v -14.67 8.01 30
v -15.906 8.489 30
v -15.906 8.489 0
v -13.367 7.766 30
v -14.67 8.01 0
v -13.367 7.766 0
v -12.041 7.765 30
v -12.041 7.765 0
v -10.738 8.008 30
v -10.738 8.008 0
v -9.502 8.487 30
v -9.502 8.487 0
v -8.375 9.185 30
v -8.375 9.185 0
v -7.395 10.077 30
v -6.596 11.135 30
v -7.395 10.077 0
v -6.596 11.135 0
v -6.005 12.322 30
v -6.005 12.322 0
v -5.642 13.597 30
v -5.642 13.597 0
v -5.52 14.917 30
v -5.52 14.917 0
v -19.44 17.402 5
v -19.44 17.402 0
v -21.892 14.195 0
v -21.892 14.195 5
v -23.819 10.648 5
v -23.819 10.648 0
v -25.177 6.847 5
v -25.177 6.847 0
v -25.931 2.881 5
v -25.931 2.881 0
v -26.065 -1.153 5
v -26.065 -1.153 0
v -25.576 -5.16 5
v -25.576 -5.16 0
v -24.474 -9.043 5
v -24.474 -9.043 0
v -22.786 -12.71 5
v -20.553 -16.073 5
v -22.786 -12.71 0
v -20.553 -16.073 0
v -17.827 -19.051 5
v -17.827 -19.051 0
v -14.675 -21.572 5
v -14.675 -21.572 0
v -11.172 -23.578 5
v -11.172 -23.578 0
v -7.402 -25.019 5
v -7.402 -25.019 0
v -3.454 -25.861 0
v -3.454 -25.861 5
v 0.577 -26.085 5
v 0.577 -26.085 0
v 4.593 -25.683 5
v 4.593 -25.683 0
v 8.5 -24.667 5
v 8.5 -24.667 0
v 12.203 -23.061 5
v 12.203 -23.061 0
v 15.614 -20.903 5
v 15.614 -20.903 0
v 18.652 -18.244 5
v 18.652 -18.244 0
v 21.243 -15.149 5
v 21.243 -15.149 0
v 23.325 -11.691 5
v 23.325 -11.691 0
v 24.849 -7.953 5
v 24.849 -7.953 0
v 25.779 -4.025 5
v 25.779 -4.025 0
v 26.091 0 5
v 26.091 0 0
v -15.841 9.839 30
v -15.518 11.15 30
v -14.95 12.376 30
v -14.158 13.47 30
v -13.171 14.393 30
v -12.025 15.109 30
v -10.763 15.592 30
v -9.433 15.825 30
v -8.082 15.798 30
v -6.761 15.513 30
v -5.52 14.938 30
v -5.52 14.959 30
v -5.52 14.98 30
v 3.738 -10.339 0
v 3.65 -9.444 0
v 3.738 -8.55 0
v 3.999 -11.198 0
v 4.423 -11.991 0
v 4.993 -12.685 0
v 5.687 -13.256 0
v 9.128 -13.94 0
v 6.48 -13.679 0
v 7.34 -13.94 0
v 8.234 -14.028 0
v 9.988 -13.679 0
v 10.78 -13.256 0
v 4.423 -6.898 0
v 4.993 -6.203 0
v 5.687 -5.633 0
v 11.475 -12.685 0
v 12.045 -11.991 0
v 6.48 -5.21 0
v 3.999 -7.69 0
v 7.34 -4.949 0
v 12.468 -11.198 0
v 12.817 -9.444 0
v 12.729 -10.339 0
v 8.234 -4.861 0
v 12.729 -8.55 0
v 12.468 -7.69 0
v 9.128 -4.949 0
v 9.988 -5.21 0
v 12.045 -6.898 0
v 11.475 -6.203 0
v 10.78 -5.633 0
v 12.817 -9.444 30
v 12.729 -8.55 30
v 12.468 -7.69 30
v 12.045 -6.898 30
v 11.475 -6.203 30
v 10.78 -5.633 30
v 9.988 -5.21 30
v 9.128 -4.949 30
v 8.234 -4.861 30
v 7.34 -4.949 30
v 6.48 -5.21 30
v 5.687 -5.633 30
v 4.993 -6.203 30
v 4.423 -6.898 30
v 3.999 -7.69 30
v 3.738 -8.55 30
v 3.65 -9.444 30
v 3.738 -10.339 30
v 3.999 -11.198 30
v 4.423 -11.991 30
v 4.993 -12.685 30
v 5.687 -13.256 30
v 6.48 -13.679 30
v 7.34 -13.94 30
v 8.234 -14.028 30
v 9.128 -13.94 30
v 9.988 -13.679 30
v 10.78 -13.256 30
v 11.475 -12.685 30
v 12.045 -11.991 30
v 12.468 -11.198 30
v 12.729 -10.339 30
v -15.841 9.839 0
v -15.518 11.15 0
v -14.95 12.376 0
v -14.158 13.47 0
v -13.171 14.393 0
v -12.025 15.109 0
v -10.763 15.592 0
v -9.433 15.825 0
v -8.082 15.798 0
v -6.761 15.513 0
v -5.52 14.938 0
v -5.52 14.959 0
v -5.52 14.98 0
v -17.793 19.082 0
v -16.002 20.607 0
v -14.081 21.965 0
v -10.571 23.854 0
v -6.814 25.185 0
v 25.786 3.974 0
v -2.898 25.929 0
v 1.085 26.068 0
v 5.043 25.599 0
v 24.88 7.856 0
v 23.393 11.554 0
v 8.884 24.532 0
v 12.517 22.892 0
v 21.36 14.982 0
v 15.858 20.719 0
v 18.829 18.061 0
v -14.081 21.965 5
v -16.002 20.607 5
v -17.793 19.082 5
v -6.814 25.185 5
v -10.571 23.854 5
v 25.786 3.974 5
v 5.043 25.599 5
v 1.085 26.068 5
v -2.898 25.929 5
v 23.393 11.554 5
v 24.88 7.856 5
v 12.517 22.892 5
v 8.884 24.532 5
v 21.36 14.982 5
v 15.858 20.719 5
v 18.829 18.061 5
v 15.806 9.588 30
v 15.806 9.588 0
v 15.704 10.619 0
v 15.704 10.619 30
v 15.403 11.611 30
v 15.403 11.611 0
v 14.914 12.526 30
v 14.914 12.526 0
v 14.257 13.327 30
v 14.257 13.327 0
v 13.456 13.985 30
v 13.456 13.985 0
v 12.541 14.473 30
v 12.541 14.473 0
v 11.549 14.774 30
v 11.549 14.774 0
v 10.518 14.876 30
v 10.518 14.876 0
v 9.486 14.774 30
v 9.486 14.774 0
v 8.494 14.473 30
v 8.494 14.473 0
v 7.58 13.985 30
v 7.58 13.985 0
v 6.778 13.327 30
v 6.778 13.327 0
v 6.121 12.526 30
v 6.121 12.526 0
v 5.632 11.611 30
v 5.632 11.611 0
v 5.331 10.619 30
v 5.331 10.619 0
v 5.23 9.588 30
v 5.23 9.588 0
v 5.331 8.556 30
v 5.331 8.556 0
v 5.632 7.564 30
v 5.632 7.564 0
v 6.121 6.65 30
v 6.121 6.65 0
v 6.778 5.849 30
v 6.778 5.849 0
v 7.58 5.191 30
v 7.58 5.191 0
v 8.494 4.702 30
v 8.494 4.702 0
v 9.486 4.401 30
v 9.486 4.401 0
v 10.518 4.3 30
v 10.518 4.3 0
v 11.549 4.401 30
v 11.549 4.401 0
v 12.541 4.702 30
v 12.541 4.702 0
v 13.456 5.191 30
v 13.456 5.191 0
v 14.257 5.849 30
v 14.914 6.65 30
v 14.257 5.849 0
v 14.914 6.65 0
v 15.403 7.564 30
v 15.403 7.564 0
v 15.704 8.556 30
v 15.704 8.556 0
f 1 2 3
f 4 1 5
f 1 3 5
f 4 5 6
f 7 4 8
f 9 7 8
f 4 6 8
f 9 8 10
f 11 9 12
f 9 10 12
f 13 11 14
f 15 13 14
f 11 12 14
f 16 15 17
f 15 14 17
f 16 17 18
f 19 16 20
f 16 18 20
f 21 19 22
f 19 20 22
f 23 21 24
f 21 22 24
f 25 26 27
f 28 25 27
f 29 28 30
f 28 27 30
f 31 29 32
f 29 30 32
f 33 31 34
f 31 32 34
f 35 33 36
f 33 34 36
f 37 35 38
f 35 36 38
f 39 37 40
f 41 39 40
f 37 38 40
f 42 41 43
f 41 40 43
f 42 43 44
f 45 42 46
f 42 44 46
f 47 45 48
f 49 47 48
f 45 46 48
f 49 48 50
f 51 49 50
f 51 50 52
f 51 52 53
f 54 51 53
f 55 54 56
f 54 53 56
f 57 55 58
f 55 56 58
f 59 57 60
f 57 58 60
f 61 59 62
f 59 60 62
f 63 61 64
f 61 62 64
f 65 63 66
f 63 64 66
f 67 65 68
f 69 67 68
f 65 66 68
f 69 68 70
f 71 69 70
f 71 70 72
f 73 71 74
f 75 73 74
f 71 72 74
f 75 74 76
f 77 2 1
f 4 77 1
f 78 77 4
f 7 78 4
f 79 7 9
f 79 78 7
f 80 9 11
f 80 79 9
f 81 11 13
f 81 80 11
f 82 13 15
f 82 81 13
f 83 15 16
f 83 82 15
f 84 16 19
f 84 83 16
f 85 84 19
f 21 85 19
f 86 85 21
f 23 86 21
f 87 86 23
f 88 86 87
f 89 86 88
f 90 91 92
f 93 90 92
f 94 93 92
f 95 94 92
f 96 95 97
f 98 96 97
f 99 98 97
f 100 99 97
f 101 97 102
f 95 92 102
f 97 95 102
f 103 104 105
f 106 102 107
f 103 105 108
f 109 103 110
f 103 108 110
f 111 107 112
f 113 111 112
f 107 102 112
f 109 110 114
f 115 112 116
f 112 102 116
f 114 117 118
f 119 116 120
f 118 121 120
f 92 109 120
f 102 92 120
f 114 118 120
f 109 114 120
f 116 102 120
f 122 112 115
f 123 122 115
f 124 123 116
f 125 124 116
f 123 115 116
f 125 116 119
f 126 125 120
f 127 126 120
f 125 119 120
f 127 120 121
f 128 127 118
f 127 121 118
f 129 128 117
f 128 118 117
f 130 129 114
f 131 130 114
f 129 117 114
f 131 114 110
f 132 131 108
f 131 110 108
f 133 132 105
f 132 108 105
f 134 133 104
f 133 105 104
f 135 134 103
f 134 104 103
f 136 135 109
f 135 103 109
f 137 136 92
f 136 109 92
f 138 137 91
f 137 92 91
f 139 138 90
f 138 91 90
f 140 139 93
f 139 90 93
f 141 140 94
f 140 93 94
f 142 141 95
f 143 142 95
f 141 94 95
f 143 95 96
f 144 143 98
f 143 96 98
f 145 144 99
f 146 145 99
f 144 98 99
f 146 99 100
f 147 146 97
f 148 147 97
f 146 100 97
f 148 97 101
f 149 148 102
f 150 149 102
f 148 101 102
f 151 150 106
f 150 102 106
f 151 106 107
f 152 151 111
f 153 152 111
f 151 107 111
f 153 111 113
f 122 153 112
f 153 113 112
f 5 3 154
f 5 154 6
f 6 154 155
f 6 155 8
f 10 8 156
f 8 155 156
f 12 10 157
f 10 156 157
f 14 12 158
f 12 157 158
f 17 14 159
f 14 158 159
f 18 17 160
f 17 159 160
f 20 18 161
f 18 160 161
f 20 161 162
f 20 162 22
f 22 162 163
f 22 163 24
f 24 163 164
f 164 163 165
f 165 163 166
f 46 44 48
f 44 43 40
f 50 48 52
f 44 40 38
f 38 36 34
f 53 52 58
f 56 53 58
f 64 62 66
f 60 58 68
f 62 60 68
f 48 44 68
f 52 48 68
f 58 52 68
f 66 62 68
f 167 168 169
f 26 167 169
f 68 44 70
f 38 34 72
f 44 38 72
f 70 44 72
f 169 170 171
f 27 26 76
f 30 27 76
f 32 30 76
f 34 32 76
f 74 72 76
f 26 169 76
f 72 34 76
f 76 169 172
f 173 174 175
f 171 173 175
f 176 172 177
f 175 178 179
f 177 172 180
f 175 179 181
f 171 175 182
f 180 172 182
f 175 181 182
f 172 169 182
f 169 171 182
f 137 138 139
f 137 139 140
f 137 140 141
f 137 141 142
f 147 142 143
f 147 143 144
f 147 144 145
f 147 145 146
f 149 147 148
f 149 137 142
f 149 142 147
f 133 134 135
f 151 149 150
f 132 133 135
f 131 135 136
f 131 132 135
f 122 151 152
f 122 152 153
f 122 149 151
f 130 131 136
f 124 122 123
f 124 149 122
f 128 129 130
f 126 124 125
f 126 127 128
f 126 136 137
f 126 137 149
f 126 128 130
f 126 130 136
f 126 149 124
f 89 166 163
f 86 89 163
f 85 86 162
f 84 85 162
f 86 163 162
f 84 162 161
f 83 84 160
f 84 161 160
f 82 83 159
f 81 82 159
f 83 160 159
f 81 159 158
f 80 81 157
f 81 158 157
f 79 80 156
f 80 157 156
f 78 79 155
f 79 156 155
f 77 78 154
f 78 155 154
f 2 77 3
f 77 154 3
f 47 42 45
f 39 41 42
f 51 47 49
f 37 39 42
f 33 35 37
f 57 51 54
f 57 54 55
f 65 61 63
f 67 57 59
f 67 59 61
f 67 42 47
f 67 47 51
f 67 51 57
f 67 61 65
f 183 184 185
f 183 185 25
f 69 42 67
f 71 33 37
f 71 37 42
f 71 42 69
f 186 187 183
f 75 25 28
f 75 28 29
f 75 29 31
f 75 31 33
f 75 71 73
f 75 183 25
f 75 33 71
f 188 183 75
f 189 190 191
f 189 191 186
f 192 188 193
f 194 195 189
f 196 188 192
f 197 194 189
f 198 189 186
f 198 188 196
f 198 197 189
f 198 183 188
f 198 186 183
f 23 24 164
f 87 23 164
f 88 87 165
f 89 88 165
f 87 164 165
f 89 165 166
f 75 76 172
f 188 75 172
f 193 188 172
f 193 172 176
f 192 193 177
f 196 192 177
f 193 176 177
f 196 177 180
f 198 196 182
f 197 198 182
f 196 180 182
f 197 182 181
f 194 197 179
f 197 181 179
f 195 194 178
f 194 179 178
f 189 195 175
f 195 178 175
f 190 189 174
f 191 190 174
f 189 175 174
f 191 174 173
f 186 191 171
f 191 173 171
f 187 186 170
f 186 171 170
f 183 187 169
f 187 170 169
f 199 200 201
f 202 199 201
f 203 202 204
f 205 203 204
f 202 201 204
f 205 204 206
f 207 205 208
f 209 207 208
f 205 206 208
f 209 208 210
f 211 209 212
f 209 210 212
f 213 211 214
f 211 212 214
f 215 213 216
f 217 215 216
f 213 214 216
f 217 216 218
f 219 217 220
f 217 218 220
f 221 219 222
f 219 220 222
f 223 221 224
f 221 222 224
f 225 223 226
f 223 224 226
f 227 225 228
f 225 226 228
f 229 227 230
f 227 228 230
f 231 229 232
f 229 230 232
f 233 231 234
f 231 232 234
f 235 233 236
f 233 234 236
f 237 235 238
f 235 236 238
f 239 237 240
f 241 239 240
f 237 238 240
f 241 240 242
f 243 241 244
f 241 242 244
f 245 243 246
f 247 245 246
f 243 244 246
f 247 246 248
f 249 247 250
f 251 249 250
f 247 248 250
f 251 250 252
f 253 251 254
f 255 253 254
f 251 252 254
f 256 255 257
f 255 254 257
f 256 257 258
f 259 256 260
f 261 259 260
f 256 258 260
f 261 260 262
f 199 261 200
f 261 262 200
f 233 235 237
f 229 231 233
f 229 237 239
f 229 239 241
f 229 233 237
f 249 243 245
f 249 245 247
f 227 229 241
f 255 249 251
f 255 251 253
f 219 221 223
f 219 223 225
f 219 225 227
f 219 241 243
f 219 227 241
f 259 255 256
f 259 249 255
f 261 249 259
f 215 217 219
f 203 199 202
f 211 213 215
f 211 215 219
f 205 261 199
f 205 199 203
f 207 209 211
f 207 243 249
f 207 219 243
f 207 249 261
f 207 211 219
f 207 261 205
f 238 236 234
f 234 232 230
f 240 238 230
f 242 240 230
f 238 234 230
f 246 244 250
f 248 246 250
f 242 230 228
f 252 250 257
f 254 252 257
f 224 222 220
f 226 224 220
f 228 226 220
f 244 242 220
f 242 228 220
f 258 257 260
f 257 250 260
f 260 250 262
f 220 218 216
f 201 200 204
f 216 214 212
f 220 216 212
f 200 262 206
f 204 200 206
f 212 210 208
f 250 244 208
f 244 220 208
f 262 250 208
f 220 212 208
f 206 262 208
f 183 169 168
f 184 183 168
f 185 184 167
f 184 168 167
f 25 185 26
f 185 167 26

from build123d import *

# Parameters (mm, degrees)
F0_R     = 5.2880711668
F1_DEPTH = 30
F0_R_2   = 4.5835550411
F2_DEPTH = 5


with BuildPart() as f1:
    # F0 (on Top) → F1 (new body)
    with BuildSketch(Plane.XY):
        with Locations((10.5176120996, 9.5877544954)):
            Circle(F0_R)
    extrude(amount=F1_DEPTH)


with BuildPart() as f1b:
    # F0 (on Top) → F1, piece 2 (new body)
    with BuildSketch(Plane.XY):
        with Locations((8.2337511703, -9.4444211572)):
            Circle(F0_R_2)
    extrude(amount=F1_DEPTH)


with BuildPart() as f1c:
    # F0 (on Top) → F1, piece 3 (new body)
    with BuildSketch(Plane.XY):
        with BuildLine():
            ThreePointArc((-5.519674576, 14.9167645723), (-5.5197449138, 14.948550137), (-5.5199559257, 14.9803350791))
            ThreePointArc((-5.5199559257, 14.9803350791), (-12.6151208881, 14.7783296274), (-15.9058179548, 8.4891734947))
            ThreePointArc((-15.9058179548, 8.4891734947), (-8.9221995143, 8.8096805433), (-5.519674576, 14.9167645723))
        make_face()
    extrude(amount=F1_DEPTH)


with BuildPart() as f2:
    # F0 (on Top) → F2 (new body)
    with BuildSketch(Plane.XY):
        with BuildLine():
            ThreePointArc((-19.4399636345, 17.4018595612), (-9.3147750864, -24.3715380596), (26.0909352516, 0))
            ThreePointArc((26.0909352516, 0), (12.5170021778, 22.892390849), (-14.0809906475, 21.9650314064))
            ThreePointArc((-14.0809906475, 21.9650314064), (-8.1614577189, 20.4815993828), (-5.5199559257, 14.9803350791))
            ThreePointArc((-5.5199559257, 14.9803350791), (-2.8556566482, 12.402251755), (-1.8764890711, 8.8264672086))
            ThreePointArc((-1.8764890711, 8.8264672086), (-8.7265125373, 1.8097757522), (-15.9058179548, 8.4891734947))
            ThreePointArc((-15.9058179548, 8.4891734947), (-19.3778917103, 12.2694328451), (-19.4399636345, 17.4018595612))
        make_face()
        with Locations((8.2337511703, -9.4444211572)):
            Circle(F0_R_2, mode=Mode.SUBTRACT)
        with Locations((10.5176120996, 9.5877544954)):
            Circle(F0_R, mode=Mode.SUBTRACT)
        with Locations((8.2337511703, -9.4444211572)):
            Circle(F0_R_2)
        with Locations((10.5176120996, 9.5877544954)):
            Circle(F0_R)
        with BuildLine():
            ThreePointArc((-1.8764890711, 8.8264672086), (-2.8556566482, 12.402251755), (-5.5199559257, 14.9803350791))
            ThreePointArc((-5.5199559257, 14.9803350791), (-5.5197449138, 14.948550137), (-5.519674576, 14.9167645723))
            ThreePointArc((-5.519674576, 14.9167645723), (-8.9221995143, 8.8096805433), (-15.9058179548, 8.4891734947))
            ThreePointArc((-15.9058179548, 8.4891734947), (-8.7265125373, 1.8097757522), (-1.8764890711, 8.8264672086))
        make_face()
        with BuildLine():
            ThreePointArc((-5.519674576, 14.9167645723), (-5.5197449138, 14.948550137), (-5.5199559257, 14.9803350791))
            ThreePointArc((-5.5199559257, 14.9803350791), (-12.6151208881, 14.7783296274), (-15.9058179548, 8.4891734947))
            ThreePointArc((-15.9058179548, 8.4891734947), (-8.9221995143, 8.8096805433), (-5.519674576, 14.9167645723))
        make_face()
        with BuildLine():
            ThreePointArc((-5.5199559257, 14.9803350791), (-8.1614577189, 20.4815993828), (-14.0809906475, 21.9650314064))
            ThreePointArc((-14.0809906475, 21.9650314064), (-16.9150592171, 19.864986131), (-19.4399636345, 17.4018595612))
            ThreePointArc((-19.4399636345, 17.4018595612), (-19.3778917103, 12.2694328451), (-15.9058179548, 8.4891734947))
            ThreePointArc((-15.9058179548, 8.4891734947), (-12.6151208881, 14.7783296274), (-5.5199559257, 14.9803350791))
        make_face()
    extrude(amount=F2_DEPTH)


solid = Compound([f1.part, f1b.part, f1c.part, f2.part])
